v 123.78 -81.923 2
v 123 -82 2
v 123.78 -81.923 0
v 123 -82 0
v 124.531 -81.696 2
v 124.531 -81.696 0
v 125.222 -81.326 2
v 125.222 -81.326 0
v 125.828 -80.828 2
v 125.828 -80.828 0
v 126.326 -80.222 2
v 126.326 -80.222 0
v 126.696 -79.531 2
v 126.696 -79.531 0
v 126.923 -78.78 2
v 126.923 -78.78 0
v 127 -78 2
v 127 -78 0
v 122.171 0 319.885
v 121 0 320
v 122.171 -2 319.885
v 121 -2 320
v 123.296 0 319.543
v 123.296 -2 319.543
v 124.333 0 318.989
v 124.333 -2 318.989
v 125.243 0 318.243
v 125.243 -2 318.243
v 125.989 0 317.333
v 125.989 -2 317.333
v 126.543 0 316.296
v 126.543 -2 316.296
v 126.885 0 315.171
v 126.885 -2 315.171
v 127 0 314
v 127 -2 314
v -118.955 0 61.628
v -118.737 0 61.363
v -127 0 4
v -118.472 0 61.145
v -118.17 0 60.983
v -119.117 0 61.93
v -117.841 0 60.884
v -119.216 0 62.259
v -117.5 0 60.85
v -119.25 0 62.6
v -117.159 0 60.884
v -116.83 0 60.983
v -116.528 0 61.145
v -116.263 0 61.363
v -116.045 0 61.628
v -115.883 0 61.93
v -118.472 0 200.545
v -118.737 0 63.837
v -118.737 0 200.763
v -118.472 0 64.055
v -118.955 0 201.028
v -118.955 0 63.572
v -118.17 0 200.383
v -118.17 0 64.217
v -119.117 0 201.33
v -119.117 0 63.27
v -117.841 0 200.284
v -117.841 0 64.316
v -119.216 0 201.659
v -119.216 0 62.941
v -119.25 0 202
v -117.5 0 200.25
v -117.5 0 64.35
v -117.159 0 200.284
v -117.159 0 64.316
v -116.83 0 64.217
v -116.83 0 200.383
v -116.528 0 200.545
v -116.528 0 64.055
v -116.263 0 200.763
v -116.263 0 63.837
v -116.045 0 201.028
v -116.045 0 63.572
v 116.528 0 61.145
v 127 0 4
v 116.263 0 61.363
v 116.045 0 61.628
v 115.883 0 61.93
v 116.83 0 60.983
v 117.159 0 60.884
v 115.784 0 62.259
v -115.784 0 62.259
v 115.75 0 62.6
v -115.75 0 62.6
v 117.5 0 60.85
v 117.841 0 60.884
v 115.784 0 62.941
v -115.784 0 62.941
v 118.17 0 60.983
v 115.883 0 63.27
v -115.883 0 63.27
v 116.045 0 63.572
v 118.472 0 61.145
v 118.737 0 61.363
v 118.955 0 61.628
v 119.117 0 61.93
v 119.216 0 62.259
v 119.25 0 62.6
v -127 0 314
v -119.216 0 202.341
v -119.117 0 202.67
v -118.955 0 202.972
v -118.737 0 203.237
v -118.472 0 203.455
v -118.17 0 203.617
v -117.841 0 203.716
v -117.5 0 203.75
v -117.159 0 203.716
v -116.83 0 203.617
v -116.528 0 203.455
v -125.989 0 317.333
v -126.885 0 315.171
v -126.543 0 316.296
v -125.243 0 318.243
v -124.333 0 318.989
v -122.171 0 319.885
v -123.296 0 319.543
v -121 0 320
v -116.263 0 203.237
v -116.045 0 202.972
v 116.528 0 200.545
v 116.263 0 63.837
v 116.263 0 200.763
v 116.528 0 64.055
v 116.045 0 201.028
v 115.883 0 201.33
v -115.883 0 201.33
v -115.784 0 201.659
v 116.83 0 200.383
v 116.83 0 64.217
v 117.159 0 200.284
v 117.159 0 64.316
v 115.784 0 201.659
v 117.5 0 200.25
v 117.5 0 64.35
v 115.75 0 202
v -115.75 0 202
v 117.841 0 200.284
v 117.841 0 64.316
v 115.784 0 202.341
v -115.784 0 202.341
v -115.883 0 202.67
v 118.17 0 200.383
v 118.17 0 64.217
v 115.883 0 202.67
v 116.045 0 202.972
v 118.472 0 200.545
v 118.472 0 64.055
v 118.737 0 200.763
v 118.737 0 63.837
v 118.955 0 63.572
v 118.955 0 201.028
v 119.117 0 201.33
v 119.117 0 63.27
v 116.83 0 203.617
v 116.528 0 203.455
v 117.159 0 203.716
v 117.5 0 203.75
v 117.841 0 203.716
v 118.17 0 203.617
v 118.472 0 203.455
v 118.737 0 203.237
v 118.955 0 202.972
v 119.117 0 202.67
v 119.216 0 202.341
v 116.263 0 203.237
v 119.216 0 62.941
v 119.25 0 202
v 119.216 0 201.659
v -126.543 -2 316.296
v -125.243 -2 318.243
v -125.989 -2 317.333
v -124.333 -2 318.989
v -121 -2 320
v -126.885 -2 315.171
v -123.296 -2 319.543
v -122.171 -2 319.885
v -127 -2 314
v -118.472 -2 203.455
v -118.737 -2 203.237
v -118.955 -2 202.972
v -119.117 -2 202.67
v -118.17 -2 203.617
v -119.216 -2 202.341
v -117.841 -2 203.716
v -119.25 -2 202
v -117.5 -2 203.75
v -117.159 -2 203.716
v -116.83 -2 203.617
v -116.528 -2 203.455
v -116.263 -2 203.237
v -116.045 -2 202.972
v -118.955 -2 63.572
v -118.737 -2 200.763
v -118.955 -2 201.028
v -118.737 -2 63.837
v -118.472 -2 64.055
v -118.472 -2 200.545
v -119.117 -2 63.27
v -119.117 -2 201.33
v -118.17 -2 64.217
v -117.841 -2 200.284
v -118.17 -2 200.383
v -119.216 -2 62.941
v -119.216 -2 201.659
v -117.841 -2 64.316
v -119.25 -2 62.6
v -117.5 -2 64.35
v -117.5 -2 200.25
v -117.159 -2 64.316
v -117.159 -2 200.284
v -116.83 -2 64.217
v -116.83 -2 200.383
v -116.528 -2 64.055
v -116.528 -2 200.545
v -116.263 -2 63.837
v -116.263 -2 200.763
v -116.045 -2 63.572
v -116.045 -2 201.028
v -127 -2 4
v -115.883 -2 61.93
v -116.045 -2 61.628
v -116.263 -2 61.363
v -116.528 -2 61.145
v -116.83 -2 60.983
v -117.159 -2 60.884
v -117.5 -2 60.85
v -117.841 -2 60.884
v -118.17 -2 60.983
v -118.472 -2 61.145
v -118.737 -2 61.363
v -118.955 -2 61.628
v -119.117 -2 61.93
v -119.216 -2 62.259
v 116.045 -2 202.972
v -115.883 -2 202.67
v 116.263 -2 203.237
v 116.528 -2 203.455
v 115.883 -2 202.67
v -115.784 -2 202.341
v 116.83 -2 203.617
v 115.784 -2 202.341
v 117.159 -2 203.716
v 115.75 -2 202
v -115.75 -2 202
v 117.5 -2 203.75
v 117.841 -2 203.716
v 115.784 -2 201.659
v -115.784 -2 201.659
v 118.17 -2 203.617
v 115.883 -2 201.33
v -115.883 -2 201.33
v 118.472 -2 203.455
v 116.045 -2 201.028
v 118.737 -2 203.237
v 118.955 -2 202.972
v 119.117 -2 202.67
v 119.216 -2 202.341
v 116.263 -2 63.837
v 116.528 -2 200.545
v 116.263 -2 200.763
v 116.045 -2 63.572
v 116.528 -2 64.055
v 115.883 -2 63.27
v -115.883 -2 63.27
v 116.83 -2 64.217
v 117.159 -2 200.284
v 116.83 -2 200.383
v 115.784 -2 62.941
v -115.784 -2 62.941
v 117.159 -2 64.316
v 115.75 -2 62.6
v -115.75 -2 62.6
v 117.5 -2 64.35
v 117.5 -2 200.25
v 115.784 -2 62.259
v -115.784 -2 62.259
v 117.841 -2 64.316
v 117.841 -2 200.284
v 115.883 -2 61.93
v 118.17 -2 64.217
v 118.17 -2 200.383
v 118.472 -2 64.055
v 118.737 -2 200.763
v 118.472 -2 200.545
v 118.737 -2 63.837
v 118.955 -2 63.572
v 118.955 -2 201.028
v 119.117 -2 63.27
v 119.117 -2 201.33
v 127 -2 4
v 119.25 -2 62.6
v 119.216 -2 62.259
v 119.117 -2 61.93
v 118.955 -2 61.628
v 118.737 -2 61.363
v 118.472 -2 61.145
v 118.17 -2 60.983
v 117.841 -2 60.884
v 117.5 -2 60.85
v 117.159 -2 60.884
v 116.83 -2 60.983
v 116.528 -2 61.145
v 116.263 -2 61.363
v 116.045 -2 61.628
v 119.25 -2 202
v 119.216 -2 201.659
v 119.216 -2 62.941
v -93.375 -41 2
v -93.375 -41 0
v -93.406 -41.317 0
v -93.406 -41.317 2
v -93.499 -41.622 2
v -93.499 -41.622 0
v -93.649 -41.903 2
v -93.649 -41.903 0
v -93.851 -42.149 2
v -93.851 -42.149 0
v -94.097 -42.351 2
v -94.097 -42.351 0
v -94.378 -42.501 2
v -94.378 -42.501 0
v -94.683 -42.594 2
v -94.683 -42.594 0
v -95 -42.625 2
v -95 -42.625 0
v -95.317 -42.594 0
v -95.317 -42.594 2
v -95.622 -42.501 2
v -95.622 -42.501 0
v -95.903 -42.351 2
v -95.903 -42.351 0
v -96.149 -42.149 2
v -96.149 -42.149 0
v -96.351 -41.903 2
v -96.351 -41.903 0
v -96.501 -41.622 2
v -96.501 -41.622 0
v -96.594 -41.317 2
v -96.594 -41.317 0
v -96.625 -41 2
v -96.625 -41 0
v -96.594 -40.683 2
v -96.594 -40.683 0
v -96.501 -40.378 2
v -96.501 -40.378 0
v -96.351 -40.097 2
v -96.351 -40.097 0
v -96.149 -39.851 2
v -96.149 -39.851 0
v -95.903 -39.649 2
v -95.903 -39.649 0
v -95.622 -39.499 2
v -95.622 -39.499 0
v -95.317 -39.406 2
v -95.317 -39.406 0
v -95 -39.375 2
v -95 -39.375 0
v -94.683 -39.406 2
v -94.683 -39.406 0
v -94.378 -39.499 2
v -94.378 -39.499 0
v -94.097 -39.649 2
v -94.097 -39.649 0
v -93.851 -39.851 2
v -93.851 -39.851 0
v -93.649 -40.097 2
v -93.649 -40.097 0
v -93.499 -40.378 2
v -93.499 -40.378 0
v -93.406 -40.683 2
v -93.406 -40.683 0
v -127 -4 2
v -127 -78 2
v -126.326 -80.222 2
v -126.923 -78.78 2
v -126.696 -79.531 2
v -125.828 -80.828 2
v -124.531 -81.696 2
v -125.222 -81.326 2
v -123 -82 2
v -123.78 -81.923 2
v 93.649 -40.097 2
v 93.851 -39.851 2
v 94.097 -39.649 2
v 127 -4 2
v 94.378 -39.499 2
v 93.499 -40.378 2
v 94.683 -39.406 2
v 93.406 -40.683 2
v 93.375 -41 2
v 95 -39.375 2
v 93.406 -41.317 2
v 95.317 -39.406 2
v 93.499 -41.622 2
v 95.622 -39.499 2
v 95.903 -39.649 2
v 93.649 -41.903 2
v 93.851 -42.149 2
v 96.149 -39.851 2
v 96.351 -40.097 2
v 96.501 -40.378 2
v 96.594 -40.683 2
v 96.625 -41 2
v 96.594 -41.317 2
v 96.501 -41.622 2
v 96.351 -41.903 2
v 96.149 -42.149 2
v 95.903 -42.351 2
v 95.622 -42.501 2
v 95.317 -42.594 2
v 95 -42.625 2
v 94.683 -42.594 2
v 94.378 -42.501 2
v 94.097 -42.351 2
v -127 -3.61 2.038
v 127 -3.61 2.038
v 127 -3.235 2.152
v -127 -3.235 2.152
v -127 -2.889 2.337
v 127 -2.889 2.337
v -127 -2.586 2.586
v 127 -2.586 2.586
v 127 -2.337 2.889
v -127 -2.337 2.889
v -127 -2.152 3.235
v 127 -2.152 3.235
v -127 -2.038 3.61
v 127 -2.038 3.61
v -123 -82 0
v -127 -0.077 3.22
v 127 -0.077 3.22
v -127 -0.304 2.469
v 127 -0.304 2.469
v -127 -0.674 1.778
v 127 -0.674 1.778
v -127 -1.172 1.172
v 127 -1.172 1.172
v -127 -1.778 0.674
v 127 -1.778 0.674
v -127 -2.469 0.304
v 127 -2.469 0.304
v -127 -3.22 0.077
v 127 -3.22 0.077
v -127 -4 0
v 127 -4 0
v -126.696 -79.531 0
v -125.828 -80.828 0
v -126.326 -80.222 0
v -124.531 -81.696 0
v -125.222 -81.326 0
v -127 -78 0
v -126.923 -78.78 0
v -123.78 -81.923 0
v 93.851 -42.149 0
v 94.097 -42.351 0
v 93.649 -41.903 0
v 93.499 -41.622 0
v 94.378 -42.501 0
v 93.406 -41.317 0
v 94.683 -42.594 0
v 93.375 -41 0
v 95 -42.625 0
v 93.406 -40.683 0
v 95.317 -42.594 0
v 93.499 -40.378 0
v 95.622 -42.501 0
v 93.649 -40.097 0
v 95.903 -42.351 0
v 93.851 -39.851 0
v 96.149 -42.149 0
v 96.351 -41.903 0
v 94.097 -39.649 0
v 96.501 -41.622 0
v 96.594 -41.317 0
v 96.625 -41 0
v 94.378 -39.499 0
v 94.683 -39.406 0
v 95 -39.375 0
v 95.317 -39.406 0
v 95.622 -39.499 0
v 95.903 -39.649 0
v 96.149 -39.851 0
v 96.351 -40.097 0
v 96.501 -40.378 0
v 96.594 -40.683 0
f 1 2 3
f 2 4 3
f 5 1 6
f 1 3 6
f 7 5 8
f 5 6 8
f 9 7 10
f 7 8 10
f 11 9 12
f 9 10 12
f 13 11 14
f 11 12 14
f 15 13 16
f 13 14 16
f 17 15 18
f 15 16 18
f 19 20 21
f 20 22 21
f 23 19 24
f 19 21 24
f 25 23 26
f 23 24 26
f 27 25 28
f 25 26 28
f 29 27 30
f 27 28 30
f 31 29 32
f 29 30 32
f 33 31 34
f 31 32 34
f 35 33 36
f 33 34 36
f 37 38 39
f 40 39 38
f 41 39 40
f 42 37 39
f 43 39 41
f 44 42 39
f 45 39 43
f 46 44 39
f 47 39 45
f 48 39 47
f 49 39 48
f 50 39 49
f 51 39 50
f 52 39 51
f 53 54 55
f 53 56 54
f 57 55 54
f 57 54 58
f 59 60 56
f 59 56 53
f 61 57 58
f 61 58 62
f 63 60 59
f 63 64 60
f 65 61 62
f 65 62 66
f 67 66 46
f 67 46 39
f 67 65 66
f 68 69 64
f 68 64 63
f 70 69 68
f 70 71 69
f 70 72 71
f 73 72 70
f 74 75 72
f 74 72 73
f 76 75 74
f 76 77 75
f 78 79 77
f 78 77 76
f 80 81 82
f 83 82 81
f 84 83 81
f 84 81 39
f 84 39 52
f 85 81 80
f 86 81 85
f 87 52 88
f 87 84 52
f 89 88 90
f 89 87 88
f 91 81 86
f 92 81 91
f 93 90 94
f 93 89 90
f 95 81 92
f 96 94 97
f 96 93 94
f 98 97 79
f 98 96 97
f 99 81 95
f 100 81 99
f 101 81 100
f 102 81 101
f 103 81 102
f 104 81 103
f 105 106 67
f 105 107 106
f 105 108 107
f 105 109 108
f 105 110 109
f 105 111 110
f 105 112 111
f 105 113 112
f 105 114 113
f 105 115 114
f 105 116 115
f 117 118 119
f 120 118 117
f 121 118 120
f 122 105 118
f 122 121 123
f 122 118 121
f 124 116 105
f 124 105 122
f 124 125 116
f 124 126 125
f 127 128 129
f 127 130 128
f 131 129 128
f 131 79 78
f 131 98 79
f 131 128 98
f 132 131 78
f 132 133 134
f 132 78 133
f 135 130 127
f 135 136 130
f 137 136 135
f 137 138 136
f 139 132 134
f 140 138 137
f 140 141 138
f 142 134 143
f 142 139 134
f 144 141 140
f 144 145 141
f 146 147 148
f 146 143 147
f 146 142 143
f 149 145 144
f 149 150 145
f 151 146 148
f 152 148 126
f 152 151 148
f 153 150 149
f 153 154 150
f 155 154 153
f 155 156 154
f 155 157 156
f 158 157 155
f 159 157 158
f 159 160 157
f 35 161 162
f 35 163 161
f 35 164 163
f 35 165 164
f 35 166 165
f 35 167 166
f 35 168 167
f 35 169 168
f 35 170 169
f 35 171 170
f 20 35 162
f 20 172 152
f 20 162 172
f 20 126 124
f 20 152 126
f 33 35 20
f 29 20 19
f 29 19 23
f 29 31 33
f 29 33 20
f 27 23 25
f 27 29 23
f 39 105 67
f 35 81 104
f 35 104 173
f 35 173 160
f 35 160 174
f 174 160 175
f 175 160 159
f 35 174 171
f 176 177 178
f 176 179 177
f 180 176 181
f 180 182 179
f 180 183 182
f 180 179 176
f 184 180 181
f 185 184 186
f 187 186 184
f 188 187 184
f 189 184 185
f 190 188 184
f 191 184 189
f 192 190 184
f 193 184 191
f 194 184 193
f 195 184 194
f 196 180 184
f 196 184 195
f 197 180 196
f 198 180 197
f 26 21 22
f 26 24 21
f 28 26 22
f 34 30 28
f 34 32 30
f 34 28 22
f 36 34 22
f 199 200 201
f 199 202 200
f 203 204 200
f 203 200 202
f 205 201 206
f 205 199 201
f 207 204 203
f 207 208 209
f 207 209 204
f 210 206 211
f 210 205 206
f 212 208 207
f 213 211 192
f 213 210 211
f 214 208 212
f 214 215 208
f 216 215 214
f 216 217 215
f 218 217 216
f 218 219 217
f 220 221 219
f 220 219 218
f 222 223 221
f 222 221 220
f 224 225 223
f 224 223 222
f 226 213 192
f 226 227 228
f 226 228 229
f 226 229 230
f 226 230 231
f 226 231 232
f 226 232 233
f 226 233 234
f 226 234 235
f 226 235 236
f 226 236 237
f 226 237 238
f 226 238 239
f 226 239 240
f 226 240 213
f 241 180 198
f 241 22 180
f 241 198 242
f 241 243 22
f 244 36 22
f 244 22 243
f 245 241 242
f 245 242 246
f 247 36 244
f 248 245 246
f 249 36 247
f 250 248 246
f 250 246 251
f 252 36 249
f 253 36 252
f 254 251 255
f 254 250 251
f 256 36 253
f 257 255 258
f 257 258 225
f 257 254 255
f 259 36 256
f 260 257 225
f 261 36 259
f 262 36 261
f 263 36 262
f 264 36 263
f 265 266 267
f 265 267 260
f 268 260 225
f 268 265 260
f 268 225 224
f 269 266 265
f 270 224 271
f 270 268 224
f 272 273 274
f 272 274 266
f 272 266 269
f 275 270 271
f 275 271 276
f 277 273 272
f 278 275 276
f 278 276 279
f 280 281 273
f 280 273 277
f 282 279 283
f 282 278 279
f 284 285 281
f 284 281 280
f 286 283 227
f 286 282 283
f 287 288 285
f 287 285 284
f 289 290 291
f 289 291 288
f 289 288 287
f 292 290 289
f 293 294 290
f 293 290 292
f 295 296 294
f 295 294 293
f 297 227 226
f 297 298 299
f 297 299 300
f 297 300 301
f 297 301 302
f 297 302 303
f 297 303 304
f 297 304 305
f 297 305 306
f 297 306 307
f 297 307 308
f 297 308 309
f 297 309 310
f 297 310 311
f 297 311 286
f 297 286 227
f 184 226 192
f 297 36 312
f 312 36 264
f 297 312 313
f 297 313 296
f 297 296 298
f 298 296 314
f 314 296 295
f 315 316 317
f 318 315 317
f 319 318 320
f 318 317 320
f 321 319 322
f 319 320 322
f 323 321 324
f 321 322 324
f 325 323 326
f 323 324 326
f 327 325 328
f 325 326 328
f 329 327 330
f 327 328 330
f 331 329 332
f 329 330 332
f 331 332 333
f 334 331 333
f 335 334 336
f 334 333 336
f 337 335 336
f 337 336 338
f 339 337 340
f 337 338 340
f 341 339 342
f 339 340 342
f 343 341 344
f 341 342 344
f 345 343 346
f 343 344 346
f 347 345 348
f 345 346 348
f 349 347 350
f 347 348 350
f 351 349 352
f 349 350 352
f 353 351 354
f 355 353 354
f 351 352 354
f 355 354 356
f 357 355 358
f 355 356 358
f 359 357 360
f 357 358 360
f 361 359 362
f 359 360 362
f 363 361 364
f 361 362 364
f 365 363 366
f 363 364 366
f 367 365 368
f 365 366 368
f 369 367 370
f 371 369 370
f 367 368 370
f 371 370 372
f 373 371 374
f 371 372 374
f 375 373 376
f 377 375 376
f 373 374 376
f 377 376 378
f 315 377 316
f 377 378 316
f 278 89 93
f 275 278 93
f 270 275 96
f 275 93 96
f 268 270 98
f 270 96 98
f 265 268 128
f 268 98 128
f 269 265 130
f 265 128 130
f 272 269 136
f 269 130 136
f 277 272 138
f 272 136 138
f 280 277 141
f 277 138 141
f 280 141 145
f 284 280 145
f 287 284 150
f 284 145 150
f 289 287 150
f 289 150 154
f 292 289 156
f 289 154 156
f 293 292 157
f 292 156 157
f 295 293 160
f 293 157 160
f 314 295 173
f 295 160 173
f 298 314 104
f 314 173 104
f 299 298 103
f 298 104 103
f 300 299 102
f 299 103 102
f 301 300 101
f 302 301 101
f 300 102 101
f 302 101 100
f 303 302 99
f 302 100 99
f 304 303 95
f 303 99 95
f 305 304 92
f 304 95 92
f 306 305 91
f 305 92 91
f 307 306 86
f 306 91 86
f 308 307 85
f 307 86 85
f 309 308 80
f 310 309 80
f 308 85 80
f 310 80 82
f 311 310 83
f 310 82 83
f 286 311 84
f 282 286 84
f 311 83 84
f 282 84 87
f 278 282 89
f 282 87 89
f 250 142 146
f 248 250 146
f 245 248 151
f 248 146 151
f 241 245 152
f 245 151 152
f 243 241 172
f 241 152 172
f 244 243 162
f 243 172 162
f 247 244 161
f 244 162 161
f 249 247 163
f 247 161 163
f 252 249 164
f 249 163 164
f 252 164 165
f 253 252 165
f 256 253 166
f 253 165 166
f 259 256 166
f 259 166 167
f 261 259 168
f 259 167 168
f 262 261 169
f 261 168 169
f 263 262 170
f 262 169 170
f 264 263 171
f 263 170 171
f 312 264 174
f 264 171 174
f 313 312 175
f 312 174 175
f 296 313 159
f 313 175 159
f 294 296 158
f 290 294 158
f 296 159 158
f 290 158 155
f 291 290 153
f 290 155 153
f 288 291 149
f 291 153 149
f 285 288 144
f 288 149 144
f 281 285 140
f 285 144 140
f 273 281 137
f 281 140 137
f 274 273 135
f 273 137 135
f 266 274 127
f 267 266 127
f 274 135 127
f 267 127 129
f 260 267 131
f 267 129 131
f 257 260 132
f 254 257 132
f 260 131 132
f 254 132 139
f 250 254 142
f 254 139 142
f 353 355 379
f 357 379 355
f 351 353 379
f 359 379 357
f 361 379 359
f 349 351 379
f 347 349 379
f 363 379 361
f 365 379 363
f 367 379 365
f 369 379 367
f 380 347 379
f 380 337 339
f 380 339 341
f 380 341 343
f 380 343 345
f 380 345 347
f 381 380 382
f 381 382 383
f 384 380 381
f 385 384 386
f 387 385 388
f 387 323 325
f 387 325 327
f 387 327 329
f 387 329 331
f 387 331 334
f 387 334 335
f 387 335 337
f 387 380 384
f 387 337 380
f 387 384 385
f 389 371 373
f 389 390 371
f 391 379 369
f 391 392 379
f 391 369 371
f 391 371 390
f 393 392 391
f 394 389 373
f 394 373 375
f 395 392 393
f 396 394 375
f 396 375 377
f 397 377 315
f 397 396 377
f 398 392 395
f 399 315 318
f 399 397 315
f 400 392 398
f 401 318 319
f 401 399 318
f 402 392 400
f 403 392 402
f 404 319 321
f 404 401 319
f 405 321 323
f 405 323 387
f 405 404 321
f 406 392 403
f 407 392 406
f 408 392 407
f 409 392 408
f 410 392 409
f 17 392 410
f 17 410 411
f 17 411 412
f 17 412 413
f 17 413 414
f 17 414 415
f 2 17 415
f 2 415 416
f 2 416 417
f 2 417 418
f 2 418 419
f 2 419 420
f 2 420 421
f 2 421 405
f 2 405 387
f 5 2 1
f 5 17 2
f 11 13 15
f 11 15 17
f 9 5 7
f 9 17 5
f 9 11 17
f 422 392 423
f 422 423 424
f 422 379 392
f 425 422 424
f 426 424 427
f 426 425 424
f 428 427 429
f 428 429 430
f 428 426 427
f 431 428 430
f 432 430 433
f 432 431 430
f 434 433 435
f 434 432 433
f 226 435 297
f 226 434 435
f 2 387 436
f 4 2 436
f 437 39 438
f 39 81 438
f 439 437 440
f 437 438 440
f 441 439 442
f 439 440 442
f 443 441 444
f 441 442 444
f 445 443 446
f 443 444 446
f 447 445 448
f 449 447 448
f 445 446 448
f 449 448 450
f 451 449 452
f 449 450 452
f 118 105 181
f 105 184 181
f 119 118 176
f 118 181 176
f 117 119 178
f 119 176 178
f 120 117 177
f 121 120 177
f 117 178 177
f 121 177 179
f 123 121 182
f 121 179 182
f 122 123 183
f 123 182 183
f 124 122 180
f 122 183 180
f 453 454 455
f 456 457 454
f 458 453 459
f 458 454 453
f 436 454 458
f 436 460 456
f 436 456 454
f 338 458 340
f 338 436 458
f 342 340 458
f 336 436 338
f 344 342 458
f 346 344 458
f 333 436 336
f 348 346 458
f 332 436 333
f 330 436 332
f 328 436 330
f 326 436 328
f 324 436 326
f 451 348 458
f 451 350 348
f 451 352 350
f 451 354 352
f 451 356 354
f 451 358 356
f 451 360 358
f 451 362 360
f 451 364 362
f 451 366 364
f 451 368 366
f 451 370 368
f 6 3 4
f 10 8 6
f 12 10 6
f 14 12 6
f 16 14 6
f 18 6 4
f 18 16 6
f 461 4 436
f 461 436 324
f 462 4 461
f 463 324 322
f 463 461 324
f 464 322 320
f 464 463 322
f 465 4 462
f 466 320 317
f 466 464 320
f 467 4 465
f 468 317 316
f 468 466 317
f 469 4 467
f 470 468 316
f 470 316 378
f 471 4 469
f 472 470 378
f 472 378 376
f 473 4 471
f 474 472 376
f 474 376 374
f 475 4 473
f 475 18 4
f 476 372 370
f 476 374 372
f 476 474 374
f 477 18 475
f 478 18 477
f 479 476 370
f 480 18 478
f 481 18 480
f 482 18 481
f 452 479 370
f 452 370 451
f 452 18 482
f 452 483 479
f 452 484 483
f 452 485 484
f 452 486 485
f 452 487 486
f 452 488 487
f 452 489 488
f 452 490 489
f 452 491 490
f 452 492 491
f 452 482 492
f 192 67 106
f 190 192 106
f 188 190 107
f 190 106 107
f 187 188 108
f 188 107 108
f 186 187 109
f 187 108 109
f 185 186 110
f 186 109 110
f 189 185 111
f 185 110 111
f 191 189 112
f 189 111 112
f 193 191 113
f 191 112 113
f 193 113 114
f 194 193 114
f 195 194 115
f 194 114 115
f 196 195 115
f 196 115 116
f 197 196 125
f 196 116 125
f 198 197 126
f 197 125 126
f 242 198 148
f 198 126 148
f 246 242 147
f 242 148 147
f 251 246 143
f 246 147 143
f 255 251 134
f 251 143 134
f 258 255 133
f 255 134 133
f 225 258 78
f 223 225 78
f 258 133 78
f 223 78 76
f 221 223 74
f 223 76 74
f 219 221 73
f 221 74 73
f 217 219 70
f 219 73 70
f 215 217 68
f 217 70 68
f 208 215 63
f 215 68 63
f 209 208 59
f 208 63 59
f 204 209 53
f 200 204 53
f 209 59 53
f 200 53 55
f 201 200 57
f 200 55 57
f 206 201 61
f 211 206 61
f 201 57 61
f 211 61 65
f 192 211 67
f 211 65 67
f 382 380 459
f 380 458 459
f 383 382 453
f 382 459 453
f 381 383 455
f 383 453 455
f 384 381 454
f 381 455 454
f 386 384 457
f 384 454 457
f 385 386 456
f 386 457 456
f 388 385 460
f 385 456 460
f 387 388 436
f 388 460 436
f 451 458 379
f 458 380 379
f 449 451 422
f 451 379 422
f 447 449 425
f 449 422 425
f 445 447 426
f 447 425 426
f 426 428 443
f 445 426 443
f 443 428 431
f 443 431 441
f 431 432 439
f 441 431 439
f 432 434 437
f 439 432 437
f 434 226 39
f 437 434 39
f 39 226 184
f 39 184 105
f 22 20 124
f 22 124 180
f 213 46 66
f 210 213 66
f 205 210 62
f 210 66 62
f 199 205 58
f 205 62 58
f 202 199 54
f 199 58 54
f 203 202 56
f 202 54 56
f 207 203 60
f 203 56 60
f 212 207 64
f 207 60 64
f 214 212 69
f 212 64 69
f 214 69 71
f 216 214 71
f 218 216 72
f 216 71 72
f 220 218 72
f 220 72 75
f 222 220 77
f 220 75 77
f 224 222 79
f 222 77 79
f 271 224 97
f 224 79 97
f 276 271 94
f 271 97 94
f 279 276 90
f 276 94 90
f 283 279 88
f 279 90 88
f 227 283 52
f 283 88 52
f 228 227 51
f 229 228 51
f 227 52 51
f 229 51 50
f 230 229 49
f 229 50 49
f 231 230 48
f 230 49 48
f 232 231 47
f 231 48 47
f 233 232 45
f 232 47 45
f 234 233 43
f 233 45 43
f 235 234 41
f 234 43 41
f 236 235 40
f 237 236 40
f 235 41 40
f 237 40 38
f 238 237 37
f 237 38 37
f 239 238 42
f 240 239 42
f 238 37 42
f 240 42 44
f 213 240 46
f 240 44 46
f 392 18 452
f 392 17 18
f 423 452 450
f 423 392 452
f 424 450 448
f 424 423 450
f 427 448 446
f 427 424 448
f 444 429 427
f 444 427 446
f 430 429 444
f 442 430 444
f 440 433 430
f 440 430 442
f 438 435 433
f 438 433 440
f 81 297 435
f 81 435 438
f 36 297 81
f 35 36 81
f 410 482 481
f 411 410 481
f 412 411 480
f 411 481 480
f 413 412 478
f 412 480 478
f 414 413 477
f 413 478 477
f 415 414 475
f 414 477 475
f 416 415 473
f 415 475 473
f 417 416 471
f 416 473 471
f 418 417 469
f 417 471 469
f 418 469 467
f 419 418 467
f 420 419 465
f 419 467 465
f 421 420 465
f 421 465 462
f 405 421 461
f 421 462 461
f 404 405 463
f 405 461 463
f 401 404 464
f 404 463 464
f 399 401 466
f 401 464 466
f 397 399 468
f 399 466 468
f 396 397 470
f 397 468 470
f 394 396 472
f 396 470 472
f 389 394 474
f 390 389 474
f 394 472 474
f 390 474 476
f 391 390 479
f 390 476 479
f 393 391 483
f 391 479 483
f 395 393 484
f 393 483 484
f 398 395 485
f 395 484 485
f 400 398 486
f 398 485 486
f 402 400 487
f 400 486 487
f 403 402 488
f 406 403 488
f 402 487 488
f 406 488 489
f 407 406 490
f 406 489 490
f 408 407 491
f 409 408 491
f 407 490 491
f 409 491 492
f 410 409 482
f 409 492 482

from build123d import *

# Parameters (mm, degrees)
F1_DEPTH = 127
F2_R     = 2
F3_R     = 4
F4_R     = 6
F5_R     = 4
F6_R     = 1.625
F7_DEPTH = 2
F8_R     = 1.75
F9_DEPTH = 2


with BuildPart() as f1:
    # F0 (on Right) → F1 (new body, symmetric)
    with BuildSketch(Plane.YZ):
        Polygon((-82, 0), (0, 0), (0, 320), (-2, 320), (-2, 2), (-82, 2), align=None)
    extrude(amount=F1_DEPTH, both=True)

    # F2
    f2_edges = [f1.edges().sort_by_distance(p)[0] for p in [
        (0, -2, 2),
    ]]
    fillet(f2_edges, radius=F2_R)

    # F3
    f3_edges = [f1.edges().sort_by_distance(p)[0] for p in [
        (0, 0, 0),
    ]]
    fillet(f3_edges, radius=F3_R)

    # F4
    f4_edges = [f1.edges().sort_by_distance(p)[0] for p in [
        (127, -1, 320),
        (-127, -1, 320),
    ]]
    fillet(f4_edges, radius=F4_R)

    # F5
    f5_edges = [f1.edges().sort_by_distance(p)[0] for p in [
        (127, -82, 1),
        (-127, -82, 1),
    ]]
    fillet(f5_edges, radius=F5_R)

    # F6 (on face) → F7 (cut, through all)
    with BuildSketch(Plane(origin=(0, 0, 0), x_dir=(1, 0, 0), z_dir=(0, 0, -1))):
        with Locations((95, 41)):
            Circle(F6_R)
        with Locations((-95, 41)):
            Circle(F6_R)
    extrude(amount=-F7_DEPTH, mode=Mode.SUBTRACT)

    # F8 (on face) → F9 (cut, through all)
    with BuildSketch(Plane(origin=(0, 0, 0), x_dir=(-1, 0, 0), z_dir=(0, 1, 0))):
        with Locations((117.5, 202)):
            Circle(F8_R)
        with Locations((-117.5, 202)):
            Circle(F8_R)
        with Locations((117.5, 62.6)):
            Circle(F8_R)
        with Locations((-117.5, 62.6)):
            Circle(F8_R)
    extrude(amount=-F9_DEPTH, mode=Mode.SUBTRACT)


solid = f1.part
